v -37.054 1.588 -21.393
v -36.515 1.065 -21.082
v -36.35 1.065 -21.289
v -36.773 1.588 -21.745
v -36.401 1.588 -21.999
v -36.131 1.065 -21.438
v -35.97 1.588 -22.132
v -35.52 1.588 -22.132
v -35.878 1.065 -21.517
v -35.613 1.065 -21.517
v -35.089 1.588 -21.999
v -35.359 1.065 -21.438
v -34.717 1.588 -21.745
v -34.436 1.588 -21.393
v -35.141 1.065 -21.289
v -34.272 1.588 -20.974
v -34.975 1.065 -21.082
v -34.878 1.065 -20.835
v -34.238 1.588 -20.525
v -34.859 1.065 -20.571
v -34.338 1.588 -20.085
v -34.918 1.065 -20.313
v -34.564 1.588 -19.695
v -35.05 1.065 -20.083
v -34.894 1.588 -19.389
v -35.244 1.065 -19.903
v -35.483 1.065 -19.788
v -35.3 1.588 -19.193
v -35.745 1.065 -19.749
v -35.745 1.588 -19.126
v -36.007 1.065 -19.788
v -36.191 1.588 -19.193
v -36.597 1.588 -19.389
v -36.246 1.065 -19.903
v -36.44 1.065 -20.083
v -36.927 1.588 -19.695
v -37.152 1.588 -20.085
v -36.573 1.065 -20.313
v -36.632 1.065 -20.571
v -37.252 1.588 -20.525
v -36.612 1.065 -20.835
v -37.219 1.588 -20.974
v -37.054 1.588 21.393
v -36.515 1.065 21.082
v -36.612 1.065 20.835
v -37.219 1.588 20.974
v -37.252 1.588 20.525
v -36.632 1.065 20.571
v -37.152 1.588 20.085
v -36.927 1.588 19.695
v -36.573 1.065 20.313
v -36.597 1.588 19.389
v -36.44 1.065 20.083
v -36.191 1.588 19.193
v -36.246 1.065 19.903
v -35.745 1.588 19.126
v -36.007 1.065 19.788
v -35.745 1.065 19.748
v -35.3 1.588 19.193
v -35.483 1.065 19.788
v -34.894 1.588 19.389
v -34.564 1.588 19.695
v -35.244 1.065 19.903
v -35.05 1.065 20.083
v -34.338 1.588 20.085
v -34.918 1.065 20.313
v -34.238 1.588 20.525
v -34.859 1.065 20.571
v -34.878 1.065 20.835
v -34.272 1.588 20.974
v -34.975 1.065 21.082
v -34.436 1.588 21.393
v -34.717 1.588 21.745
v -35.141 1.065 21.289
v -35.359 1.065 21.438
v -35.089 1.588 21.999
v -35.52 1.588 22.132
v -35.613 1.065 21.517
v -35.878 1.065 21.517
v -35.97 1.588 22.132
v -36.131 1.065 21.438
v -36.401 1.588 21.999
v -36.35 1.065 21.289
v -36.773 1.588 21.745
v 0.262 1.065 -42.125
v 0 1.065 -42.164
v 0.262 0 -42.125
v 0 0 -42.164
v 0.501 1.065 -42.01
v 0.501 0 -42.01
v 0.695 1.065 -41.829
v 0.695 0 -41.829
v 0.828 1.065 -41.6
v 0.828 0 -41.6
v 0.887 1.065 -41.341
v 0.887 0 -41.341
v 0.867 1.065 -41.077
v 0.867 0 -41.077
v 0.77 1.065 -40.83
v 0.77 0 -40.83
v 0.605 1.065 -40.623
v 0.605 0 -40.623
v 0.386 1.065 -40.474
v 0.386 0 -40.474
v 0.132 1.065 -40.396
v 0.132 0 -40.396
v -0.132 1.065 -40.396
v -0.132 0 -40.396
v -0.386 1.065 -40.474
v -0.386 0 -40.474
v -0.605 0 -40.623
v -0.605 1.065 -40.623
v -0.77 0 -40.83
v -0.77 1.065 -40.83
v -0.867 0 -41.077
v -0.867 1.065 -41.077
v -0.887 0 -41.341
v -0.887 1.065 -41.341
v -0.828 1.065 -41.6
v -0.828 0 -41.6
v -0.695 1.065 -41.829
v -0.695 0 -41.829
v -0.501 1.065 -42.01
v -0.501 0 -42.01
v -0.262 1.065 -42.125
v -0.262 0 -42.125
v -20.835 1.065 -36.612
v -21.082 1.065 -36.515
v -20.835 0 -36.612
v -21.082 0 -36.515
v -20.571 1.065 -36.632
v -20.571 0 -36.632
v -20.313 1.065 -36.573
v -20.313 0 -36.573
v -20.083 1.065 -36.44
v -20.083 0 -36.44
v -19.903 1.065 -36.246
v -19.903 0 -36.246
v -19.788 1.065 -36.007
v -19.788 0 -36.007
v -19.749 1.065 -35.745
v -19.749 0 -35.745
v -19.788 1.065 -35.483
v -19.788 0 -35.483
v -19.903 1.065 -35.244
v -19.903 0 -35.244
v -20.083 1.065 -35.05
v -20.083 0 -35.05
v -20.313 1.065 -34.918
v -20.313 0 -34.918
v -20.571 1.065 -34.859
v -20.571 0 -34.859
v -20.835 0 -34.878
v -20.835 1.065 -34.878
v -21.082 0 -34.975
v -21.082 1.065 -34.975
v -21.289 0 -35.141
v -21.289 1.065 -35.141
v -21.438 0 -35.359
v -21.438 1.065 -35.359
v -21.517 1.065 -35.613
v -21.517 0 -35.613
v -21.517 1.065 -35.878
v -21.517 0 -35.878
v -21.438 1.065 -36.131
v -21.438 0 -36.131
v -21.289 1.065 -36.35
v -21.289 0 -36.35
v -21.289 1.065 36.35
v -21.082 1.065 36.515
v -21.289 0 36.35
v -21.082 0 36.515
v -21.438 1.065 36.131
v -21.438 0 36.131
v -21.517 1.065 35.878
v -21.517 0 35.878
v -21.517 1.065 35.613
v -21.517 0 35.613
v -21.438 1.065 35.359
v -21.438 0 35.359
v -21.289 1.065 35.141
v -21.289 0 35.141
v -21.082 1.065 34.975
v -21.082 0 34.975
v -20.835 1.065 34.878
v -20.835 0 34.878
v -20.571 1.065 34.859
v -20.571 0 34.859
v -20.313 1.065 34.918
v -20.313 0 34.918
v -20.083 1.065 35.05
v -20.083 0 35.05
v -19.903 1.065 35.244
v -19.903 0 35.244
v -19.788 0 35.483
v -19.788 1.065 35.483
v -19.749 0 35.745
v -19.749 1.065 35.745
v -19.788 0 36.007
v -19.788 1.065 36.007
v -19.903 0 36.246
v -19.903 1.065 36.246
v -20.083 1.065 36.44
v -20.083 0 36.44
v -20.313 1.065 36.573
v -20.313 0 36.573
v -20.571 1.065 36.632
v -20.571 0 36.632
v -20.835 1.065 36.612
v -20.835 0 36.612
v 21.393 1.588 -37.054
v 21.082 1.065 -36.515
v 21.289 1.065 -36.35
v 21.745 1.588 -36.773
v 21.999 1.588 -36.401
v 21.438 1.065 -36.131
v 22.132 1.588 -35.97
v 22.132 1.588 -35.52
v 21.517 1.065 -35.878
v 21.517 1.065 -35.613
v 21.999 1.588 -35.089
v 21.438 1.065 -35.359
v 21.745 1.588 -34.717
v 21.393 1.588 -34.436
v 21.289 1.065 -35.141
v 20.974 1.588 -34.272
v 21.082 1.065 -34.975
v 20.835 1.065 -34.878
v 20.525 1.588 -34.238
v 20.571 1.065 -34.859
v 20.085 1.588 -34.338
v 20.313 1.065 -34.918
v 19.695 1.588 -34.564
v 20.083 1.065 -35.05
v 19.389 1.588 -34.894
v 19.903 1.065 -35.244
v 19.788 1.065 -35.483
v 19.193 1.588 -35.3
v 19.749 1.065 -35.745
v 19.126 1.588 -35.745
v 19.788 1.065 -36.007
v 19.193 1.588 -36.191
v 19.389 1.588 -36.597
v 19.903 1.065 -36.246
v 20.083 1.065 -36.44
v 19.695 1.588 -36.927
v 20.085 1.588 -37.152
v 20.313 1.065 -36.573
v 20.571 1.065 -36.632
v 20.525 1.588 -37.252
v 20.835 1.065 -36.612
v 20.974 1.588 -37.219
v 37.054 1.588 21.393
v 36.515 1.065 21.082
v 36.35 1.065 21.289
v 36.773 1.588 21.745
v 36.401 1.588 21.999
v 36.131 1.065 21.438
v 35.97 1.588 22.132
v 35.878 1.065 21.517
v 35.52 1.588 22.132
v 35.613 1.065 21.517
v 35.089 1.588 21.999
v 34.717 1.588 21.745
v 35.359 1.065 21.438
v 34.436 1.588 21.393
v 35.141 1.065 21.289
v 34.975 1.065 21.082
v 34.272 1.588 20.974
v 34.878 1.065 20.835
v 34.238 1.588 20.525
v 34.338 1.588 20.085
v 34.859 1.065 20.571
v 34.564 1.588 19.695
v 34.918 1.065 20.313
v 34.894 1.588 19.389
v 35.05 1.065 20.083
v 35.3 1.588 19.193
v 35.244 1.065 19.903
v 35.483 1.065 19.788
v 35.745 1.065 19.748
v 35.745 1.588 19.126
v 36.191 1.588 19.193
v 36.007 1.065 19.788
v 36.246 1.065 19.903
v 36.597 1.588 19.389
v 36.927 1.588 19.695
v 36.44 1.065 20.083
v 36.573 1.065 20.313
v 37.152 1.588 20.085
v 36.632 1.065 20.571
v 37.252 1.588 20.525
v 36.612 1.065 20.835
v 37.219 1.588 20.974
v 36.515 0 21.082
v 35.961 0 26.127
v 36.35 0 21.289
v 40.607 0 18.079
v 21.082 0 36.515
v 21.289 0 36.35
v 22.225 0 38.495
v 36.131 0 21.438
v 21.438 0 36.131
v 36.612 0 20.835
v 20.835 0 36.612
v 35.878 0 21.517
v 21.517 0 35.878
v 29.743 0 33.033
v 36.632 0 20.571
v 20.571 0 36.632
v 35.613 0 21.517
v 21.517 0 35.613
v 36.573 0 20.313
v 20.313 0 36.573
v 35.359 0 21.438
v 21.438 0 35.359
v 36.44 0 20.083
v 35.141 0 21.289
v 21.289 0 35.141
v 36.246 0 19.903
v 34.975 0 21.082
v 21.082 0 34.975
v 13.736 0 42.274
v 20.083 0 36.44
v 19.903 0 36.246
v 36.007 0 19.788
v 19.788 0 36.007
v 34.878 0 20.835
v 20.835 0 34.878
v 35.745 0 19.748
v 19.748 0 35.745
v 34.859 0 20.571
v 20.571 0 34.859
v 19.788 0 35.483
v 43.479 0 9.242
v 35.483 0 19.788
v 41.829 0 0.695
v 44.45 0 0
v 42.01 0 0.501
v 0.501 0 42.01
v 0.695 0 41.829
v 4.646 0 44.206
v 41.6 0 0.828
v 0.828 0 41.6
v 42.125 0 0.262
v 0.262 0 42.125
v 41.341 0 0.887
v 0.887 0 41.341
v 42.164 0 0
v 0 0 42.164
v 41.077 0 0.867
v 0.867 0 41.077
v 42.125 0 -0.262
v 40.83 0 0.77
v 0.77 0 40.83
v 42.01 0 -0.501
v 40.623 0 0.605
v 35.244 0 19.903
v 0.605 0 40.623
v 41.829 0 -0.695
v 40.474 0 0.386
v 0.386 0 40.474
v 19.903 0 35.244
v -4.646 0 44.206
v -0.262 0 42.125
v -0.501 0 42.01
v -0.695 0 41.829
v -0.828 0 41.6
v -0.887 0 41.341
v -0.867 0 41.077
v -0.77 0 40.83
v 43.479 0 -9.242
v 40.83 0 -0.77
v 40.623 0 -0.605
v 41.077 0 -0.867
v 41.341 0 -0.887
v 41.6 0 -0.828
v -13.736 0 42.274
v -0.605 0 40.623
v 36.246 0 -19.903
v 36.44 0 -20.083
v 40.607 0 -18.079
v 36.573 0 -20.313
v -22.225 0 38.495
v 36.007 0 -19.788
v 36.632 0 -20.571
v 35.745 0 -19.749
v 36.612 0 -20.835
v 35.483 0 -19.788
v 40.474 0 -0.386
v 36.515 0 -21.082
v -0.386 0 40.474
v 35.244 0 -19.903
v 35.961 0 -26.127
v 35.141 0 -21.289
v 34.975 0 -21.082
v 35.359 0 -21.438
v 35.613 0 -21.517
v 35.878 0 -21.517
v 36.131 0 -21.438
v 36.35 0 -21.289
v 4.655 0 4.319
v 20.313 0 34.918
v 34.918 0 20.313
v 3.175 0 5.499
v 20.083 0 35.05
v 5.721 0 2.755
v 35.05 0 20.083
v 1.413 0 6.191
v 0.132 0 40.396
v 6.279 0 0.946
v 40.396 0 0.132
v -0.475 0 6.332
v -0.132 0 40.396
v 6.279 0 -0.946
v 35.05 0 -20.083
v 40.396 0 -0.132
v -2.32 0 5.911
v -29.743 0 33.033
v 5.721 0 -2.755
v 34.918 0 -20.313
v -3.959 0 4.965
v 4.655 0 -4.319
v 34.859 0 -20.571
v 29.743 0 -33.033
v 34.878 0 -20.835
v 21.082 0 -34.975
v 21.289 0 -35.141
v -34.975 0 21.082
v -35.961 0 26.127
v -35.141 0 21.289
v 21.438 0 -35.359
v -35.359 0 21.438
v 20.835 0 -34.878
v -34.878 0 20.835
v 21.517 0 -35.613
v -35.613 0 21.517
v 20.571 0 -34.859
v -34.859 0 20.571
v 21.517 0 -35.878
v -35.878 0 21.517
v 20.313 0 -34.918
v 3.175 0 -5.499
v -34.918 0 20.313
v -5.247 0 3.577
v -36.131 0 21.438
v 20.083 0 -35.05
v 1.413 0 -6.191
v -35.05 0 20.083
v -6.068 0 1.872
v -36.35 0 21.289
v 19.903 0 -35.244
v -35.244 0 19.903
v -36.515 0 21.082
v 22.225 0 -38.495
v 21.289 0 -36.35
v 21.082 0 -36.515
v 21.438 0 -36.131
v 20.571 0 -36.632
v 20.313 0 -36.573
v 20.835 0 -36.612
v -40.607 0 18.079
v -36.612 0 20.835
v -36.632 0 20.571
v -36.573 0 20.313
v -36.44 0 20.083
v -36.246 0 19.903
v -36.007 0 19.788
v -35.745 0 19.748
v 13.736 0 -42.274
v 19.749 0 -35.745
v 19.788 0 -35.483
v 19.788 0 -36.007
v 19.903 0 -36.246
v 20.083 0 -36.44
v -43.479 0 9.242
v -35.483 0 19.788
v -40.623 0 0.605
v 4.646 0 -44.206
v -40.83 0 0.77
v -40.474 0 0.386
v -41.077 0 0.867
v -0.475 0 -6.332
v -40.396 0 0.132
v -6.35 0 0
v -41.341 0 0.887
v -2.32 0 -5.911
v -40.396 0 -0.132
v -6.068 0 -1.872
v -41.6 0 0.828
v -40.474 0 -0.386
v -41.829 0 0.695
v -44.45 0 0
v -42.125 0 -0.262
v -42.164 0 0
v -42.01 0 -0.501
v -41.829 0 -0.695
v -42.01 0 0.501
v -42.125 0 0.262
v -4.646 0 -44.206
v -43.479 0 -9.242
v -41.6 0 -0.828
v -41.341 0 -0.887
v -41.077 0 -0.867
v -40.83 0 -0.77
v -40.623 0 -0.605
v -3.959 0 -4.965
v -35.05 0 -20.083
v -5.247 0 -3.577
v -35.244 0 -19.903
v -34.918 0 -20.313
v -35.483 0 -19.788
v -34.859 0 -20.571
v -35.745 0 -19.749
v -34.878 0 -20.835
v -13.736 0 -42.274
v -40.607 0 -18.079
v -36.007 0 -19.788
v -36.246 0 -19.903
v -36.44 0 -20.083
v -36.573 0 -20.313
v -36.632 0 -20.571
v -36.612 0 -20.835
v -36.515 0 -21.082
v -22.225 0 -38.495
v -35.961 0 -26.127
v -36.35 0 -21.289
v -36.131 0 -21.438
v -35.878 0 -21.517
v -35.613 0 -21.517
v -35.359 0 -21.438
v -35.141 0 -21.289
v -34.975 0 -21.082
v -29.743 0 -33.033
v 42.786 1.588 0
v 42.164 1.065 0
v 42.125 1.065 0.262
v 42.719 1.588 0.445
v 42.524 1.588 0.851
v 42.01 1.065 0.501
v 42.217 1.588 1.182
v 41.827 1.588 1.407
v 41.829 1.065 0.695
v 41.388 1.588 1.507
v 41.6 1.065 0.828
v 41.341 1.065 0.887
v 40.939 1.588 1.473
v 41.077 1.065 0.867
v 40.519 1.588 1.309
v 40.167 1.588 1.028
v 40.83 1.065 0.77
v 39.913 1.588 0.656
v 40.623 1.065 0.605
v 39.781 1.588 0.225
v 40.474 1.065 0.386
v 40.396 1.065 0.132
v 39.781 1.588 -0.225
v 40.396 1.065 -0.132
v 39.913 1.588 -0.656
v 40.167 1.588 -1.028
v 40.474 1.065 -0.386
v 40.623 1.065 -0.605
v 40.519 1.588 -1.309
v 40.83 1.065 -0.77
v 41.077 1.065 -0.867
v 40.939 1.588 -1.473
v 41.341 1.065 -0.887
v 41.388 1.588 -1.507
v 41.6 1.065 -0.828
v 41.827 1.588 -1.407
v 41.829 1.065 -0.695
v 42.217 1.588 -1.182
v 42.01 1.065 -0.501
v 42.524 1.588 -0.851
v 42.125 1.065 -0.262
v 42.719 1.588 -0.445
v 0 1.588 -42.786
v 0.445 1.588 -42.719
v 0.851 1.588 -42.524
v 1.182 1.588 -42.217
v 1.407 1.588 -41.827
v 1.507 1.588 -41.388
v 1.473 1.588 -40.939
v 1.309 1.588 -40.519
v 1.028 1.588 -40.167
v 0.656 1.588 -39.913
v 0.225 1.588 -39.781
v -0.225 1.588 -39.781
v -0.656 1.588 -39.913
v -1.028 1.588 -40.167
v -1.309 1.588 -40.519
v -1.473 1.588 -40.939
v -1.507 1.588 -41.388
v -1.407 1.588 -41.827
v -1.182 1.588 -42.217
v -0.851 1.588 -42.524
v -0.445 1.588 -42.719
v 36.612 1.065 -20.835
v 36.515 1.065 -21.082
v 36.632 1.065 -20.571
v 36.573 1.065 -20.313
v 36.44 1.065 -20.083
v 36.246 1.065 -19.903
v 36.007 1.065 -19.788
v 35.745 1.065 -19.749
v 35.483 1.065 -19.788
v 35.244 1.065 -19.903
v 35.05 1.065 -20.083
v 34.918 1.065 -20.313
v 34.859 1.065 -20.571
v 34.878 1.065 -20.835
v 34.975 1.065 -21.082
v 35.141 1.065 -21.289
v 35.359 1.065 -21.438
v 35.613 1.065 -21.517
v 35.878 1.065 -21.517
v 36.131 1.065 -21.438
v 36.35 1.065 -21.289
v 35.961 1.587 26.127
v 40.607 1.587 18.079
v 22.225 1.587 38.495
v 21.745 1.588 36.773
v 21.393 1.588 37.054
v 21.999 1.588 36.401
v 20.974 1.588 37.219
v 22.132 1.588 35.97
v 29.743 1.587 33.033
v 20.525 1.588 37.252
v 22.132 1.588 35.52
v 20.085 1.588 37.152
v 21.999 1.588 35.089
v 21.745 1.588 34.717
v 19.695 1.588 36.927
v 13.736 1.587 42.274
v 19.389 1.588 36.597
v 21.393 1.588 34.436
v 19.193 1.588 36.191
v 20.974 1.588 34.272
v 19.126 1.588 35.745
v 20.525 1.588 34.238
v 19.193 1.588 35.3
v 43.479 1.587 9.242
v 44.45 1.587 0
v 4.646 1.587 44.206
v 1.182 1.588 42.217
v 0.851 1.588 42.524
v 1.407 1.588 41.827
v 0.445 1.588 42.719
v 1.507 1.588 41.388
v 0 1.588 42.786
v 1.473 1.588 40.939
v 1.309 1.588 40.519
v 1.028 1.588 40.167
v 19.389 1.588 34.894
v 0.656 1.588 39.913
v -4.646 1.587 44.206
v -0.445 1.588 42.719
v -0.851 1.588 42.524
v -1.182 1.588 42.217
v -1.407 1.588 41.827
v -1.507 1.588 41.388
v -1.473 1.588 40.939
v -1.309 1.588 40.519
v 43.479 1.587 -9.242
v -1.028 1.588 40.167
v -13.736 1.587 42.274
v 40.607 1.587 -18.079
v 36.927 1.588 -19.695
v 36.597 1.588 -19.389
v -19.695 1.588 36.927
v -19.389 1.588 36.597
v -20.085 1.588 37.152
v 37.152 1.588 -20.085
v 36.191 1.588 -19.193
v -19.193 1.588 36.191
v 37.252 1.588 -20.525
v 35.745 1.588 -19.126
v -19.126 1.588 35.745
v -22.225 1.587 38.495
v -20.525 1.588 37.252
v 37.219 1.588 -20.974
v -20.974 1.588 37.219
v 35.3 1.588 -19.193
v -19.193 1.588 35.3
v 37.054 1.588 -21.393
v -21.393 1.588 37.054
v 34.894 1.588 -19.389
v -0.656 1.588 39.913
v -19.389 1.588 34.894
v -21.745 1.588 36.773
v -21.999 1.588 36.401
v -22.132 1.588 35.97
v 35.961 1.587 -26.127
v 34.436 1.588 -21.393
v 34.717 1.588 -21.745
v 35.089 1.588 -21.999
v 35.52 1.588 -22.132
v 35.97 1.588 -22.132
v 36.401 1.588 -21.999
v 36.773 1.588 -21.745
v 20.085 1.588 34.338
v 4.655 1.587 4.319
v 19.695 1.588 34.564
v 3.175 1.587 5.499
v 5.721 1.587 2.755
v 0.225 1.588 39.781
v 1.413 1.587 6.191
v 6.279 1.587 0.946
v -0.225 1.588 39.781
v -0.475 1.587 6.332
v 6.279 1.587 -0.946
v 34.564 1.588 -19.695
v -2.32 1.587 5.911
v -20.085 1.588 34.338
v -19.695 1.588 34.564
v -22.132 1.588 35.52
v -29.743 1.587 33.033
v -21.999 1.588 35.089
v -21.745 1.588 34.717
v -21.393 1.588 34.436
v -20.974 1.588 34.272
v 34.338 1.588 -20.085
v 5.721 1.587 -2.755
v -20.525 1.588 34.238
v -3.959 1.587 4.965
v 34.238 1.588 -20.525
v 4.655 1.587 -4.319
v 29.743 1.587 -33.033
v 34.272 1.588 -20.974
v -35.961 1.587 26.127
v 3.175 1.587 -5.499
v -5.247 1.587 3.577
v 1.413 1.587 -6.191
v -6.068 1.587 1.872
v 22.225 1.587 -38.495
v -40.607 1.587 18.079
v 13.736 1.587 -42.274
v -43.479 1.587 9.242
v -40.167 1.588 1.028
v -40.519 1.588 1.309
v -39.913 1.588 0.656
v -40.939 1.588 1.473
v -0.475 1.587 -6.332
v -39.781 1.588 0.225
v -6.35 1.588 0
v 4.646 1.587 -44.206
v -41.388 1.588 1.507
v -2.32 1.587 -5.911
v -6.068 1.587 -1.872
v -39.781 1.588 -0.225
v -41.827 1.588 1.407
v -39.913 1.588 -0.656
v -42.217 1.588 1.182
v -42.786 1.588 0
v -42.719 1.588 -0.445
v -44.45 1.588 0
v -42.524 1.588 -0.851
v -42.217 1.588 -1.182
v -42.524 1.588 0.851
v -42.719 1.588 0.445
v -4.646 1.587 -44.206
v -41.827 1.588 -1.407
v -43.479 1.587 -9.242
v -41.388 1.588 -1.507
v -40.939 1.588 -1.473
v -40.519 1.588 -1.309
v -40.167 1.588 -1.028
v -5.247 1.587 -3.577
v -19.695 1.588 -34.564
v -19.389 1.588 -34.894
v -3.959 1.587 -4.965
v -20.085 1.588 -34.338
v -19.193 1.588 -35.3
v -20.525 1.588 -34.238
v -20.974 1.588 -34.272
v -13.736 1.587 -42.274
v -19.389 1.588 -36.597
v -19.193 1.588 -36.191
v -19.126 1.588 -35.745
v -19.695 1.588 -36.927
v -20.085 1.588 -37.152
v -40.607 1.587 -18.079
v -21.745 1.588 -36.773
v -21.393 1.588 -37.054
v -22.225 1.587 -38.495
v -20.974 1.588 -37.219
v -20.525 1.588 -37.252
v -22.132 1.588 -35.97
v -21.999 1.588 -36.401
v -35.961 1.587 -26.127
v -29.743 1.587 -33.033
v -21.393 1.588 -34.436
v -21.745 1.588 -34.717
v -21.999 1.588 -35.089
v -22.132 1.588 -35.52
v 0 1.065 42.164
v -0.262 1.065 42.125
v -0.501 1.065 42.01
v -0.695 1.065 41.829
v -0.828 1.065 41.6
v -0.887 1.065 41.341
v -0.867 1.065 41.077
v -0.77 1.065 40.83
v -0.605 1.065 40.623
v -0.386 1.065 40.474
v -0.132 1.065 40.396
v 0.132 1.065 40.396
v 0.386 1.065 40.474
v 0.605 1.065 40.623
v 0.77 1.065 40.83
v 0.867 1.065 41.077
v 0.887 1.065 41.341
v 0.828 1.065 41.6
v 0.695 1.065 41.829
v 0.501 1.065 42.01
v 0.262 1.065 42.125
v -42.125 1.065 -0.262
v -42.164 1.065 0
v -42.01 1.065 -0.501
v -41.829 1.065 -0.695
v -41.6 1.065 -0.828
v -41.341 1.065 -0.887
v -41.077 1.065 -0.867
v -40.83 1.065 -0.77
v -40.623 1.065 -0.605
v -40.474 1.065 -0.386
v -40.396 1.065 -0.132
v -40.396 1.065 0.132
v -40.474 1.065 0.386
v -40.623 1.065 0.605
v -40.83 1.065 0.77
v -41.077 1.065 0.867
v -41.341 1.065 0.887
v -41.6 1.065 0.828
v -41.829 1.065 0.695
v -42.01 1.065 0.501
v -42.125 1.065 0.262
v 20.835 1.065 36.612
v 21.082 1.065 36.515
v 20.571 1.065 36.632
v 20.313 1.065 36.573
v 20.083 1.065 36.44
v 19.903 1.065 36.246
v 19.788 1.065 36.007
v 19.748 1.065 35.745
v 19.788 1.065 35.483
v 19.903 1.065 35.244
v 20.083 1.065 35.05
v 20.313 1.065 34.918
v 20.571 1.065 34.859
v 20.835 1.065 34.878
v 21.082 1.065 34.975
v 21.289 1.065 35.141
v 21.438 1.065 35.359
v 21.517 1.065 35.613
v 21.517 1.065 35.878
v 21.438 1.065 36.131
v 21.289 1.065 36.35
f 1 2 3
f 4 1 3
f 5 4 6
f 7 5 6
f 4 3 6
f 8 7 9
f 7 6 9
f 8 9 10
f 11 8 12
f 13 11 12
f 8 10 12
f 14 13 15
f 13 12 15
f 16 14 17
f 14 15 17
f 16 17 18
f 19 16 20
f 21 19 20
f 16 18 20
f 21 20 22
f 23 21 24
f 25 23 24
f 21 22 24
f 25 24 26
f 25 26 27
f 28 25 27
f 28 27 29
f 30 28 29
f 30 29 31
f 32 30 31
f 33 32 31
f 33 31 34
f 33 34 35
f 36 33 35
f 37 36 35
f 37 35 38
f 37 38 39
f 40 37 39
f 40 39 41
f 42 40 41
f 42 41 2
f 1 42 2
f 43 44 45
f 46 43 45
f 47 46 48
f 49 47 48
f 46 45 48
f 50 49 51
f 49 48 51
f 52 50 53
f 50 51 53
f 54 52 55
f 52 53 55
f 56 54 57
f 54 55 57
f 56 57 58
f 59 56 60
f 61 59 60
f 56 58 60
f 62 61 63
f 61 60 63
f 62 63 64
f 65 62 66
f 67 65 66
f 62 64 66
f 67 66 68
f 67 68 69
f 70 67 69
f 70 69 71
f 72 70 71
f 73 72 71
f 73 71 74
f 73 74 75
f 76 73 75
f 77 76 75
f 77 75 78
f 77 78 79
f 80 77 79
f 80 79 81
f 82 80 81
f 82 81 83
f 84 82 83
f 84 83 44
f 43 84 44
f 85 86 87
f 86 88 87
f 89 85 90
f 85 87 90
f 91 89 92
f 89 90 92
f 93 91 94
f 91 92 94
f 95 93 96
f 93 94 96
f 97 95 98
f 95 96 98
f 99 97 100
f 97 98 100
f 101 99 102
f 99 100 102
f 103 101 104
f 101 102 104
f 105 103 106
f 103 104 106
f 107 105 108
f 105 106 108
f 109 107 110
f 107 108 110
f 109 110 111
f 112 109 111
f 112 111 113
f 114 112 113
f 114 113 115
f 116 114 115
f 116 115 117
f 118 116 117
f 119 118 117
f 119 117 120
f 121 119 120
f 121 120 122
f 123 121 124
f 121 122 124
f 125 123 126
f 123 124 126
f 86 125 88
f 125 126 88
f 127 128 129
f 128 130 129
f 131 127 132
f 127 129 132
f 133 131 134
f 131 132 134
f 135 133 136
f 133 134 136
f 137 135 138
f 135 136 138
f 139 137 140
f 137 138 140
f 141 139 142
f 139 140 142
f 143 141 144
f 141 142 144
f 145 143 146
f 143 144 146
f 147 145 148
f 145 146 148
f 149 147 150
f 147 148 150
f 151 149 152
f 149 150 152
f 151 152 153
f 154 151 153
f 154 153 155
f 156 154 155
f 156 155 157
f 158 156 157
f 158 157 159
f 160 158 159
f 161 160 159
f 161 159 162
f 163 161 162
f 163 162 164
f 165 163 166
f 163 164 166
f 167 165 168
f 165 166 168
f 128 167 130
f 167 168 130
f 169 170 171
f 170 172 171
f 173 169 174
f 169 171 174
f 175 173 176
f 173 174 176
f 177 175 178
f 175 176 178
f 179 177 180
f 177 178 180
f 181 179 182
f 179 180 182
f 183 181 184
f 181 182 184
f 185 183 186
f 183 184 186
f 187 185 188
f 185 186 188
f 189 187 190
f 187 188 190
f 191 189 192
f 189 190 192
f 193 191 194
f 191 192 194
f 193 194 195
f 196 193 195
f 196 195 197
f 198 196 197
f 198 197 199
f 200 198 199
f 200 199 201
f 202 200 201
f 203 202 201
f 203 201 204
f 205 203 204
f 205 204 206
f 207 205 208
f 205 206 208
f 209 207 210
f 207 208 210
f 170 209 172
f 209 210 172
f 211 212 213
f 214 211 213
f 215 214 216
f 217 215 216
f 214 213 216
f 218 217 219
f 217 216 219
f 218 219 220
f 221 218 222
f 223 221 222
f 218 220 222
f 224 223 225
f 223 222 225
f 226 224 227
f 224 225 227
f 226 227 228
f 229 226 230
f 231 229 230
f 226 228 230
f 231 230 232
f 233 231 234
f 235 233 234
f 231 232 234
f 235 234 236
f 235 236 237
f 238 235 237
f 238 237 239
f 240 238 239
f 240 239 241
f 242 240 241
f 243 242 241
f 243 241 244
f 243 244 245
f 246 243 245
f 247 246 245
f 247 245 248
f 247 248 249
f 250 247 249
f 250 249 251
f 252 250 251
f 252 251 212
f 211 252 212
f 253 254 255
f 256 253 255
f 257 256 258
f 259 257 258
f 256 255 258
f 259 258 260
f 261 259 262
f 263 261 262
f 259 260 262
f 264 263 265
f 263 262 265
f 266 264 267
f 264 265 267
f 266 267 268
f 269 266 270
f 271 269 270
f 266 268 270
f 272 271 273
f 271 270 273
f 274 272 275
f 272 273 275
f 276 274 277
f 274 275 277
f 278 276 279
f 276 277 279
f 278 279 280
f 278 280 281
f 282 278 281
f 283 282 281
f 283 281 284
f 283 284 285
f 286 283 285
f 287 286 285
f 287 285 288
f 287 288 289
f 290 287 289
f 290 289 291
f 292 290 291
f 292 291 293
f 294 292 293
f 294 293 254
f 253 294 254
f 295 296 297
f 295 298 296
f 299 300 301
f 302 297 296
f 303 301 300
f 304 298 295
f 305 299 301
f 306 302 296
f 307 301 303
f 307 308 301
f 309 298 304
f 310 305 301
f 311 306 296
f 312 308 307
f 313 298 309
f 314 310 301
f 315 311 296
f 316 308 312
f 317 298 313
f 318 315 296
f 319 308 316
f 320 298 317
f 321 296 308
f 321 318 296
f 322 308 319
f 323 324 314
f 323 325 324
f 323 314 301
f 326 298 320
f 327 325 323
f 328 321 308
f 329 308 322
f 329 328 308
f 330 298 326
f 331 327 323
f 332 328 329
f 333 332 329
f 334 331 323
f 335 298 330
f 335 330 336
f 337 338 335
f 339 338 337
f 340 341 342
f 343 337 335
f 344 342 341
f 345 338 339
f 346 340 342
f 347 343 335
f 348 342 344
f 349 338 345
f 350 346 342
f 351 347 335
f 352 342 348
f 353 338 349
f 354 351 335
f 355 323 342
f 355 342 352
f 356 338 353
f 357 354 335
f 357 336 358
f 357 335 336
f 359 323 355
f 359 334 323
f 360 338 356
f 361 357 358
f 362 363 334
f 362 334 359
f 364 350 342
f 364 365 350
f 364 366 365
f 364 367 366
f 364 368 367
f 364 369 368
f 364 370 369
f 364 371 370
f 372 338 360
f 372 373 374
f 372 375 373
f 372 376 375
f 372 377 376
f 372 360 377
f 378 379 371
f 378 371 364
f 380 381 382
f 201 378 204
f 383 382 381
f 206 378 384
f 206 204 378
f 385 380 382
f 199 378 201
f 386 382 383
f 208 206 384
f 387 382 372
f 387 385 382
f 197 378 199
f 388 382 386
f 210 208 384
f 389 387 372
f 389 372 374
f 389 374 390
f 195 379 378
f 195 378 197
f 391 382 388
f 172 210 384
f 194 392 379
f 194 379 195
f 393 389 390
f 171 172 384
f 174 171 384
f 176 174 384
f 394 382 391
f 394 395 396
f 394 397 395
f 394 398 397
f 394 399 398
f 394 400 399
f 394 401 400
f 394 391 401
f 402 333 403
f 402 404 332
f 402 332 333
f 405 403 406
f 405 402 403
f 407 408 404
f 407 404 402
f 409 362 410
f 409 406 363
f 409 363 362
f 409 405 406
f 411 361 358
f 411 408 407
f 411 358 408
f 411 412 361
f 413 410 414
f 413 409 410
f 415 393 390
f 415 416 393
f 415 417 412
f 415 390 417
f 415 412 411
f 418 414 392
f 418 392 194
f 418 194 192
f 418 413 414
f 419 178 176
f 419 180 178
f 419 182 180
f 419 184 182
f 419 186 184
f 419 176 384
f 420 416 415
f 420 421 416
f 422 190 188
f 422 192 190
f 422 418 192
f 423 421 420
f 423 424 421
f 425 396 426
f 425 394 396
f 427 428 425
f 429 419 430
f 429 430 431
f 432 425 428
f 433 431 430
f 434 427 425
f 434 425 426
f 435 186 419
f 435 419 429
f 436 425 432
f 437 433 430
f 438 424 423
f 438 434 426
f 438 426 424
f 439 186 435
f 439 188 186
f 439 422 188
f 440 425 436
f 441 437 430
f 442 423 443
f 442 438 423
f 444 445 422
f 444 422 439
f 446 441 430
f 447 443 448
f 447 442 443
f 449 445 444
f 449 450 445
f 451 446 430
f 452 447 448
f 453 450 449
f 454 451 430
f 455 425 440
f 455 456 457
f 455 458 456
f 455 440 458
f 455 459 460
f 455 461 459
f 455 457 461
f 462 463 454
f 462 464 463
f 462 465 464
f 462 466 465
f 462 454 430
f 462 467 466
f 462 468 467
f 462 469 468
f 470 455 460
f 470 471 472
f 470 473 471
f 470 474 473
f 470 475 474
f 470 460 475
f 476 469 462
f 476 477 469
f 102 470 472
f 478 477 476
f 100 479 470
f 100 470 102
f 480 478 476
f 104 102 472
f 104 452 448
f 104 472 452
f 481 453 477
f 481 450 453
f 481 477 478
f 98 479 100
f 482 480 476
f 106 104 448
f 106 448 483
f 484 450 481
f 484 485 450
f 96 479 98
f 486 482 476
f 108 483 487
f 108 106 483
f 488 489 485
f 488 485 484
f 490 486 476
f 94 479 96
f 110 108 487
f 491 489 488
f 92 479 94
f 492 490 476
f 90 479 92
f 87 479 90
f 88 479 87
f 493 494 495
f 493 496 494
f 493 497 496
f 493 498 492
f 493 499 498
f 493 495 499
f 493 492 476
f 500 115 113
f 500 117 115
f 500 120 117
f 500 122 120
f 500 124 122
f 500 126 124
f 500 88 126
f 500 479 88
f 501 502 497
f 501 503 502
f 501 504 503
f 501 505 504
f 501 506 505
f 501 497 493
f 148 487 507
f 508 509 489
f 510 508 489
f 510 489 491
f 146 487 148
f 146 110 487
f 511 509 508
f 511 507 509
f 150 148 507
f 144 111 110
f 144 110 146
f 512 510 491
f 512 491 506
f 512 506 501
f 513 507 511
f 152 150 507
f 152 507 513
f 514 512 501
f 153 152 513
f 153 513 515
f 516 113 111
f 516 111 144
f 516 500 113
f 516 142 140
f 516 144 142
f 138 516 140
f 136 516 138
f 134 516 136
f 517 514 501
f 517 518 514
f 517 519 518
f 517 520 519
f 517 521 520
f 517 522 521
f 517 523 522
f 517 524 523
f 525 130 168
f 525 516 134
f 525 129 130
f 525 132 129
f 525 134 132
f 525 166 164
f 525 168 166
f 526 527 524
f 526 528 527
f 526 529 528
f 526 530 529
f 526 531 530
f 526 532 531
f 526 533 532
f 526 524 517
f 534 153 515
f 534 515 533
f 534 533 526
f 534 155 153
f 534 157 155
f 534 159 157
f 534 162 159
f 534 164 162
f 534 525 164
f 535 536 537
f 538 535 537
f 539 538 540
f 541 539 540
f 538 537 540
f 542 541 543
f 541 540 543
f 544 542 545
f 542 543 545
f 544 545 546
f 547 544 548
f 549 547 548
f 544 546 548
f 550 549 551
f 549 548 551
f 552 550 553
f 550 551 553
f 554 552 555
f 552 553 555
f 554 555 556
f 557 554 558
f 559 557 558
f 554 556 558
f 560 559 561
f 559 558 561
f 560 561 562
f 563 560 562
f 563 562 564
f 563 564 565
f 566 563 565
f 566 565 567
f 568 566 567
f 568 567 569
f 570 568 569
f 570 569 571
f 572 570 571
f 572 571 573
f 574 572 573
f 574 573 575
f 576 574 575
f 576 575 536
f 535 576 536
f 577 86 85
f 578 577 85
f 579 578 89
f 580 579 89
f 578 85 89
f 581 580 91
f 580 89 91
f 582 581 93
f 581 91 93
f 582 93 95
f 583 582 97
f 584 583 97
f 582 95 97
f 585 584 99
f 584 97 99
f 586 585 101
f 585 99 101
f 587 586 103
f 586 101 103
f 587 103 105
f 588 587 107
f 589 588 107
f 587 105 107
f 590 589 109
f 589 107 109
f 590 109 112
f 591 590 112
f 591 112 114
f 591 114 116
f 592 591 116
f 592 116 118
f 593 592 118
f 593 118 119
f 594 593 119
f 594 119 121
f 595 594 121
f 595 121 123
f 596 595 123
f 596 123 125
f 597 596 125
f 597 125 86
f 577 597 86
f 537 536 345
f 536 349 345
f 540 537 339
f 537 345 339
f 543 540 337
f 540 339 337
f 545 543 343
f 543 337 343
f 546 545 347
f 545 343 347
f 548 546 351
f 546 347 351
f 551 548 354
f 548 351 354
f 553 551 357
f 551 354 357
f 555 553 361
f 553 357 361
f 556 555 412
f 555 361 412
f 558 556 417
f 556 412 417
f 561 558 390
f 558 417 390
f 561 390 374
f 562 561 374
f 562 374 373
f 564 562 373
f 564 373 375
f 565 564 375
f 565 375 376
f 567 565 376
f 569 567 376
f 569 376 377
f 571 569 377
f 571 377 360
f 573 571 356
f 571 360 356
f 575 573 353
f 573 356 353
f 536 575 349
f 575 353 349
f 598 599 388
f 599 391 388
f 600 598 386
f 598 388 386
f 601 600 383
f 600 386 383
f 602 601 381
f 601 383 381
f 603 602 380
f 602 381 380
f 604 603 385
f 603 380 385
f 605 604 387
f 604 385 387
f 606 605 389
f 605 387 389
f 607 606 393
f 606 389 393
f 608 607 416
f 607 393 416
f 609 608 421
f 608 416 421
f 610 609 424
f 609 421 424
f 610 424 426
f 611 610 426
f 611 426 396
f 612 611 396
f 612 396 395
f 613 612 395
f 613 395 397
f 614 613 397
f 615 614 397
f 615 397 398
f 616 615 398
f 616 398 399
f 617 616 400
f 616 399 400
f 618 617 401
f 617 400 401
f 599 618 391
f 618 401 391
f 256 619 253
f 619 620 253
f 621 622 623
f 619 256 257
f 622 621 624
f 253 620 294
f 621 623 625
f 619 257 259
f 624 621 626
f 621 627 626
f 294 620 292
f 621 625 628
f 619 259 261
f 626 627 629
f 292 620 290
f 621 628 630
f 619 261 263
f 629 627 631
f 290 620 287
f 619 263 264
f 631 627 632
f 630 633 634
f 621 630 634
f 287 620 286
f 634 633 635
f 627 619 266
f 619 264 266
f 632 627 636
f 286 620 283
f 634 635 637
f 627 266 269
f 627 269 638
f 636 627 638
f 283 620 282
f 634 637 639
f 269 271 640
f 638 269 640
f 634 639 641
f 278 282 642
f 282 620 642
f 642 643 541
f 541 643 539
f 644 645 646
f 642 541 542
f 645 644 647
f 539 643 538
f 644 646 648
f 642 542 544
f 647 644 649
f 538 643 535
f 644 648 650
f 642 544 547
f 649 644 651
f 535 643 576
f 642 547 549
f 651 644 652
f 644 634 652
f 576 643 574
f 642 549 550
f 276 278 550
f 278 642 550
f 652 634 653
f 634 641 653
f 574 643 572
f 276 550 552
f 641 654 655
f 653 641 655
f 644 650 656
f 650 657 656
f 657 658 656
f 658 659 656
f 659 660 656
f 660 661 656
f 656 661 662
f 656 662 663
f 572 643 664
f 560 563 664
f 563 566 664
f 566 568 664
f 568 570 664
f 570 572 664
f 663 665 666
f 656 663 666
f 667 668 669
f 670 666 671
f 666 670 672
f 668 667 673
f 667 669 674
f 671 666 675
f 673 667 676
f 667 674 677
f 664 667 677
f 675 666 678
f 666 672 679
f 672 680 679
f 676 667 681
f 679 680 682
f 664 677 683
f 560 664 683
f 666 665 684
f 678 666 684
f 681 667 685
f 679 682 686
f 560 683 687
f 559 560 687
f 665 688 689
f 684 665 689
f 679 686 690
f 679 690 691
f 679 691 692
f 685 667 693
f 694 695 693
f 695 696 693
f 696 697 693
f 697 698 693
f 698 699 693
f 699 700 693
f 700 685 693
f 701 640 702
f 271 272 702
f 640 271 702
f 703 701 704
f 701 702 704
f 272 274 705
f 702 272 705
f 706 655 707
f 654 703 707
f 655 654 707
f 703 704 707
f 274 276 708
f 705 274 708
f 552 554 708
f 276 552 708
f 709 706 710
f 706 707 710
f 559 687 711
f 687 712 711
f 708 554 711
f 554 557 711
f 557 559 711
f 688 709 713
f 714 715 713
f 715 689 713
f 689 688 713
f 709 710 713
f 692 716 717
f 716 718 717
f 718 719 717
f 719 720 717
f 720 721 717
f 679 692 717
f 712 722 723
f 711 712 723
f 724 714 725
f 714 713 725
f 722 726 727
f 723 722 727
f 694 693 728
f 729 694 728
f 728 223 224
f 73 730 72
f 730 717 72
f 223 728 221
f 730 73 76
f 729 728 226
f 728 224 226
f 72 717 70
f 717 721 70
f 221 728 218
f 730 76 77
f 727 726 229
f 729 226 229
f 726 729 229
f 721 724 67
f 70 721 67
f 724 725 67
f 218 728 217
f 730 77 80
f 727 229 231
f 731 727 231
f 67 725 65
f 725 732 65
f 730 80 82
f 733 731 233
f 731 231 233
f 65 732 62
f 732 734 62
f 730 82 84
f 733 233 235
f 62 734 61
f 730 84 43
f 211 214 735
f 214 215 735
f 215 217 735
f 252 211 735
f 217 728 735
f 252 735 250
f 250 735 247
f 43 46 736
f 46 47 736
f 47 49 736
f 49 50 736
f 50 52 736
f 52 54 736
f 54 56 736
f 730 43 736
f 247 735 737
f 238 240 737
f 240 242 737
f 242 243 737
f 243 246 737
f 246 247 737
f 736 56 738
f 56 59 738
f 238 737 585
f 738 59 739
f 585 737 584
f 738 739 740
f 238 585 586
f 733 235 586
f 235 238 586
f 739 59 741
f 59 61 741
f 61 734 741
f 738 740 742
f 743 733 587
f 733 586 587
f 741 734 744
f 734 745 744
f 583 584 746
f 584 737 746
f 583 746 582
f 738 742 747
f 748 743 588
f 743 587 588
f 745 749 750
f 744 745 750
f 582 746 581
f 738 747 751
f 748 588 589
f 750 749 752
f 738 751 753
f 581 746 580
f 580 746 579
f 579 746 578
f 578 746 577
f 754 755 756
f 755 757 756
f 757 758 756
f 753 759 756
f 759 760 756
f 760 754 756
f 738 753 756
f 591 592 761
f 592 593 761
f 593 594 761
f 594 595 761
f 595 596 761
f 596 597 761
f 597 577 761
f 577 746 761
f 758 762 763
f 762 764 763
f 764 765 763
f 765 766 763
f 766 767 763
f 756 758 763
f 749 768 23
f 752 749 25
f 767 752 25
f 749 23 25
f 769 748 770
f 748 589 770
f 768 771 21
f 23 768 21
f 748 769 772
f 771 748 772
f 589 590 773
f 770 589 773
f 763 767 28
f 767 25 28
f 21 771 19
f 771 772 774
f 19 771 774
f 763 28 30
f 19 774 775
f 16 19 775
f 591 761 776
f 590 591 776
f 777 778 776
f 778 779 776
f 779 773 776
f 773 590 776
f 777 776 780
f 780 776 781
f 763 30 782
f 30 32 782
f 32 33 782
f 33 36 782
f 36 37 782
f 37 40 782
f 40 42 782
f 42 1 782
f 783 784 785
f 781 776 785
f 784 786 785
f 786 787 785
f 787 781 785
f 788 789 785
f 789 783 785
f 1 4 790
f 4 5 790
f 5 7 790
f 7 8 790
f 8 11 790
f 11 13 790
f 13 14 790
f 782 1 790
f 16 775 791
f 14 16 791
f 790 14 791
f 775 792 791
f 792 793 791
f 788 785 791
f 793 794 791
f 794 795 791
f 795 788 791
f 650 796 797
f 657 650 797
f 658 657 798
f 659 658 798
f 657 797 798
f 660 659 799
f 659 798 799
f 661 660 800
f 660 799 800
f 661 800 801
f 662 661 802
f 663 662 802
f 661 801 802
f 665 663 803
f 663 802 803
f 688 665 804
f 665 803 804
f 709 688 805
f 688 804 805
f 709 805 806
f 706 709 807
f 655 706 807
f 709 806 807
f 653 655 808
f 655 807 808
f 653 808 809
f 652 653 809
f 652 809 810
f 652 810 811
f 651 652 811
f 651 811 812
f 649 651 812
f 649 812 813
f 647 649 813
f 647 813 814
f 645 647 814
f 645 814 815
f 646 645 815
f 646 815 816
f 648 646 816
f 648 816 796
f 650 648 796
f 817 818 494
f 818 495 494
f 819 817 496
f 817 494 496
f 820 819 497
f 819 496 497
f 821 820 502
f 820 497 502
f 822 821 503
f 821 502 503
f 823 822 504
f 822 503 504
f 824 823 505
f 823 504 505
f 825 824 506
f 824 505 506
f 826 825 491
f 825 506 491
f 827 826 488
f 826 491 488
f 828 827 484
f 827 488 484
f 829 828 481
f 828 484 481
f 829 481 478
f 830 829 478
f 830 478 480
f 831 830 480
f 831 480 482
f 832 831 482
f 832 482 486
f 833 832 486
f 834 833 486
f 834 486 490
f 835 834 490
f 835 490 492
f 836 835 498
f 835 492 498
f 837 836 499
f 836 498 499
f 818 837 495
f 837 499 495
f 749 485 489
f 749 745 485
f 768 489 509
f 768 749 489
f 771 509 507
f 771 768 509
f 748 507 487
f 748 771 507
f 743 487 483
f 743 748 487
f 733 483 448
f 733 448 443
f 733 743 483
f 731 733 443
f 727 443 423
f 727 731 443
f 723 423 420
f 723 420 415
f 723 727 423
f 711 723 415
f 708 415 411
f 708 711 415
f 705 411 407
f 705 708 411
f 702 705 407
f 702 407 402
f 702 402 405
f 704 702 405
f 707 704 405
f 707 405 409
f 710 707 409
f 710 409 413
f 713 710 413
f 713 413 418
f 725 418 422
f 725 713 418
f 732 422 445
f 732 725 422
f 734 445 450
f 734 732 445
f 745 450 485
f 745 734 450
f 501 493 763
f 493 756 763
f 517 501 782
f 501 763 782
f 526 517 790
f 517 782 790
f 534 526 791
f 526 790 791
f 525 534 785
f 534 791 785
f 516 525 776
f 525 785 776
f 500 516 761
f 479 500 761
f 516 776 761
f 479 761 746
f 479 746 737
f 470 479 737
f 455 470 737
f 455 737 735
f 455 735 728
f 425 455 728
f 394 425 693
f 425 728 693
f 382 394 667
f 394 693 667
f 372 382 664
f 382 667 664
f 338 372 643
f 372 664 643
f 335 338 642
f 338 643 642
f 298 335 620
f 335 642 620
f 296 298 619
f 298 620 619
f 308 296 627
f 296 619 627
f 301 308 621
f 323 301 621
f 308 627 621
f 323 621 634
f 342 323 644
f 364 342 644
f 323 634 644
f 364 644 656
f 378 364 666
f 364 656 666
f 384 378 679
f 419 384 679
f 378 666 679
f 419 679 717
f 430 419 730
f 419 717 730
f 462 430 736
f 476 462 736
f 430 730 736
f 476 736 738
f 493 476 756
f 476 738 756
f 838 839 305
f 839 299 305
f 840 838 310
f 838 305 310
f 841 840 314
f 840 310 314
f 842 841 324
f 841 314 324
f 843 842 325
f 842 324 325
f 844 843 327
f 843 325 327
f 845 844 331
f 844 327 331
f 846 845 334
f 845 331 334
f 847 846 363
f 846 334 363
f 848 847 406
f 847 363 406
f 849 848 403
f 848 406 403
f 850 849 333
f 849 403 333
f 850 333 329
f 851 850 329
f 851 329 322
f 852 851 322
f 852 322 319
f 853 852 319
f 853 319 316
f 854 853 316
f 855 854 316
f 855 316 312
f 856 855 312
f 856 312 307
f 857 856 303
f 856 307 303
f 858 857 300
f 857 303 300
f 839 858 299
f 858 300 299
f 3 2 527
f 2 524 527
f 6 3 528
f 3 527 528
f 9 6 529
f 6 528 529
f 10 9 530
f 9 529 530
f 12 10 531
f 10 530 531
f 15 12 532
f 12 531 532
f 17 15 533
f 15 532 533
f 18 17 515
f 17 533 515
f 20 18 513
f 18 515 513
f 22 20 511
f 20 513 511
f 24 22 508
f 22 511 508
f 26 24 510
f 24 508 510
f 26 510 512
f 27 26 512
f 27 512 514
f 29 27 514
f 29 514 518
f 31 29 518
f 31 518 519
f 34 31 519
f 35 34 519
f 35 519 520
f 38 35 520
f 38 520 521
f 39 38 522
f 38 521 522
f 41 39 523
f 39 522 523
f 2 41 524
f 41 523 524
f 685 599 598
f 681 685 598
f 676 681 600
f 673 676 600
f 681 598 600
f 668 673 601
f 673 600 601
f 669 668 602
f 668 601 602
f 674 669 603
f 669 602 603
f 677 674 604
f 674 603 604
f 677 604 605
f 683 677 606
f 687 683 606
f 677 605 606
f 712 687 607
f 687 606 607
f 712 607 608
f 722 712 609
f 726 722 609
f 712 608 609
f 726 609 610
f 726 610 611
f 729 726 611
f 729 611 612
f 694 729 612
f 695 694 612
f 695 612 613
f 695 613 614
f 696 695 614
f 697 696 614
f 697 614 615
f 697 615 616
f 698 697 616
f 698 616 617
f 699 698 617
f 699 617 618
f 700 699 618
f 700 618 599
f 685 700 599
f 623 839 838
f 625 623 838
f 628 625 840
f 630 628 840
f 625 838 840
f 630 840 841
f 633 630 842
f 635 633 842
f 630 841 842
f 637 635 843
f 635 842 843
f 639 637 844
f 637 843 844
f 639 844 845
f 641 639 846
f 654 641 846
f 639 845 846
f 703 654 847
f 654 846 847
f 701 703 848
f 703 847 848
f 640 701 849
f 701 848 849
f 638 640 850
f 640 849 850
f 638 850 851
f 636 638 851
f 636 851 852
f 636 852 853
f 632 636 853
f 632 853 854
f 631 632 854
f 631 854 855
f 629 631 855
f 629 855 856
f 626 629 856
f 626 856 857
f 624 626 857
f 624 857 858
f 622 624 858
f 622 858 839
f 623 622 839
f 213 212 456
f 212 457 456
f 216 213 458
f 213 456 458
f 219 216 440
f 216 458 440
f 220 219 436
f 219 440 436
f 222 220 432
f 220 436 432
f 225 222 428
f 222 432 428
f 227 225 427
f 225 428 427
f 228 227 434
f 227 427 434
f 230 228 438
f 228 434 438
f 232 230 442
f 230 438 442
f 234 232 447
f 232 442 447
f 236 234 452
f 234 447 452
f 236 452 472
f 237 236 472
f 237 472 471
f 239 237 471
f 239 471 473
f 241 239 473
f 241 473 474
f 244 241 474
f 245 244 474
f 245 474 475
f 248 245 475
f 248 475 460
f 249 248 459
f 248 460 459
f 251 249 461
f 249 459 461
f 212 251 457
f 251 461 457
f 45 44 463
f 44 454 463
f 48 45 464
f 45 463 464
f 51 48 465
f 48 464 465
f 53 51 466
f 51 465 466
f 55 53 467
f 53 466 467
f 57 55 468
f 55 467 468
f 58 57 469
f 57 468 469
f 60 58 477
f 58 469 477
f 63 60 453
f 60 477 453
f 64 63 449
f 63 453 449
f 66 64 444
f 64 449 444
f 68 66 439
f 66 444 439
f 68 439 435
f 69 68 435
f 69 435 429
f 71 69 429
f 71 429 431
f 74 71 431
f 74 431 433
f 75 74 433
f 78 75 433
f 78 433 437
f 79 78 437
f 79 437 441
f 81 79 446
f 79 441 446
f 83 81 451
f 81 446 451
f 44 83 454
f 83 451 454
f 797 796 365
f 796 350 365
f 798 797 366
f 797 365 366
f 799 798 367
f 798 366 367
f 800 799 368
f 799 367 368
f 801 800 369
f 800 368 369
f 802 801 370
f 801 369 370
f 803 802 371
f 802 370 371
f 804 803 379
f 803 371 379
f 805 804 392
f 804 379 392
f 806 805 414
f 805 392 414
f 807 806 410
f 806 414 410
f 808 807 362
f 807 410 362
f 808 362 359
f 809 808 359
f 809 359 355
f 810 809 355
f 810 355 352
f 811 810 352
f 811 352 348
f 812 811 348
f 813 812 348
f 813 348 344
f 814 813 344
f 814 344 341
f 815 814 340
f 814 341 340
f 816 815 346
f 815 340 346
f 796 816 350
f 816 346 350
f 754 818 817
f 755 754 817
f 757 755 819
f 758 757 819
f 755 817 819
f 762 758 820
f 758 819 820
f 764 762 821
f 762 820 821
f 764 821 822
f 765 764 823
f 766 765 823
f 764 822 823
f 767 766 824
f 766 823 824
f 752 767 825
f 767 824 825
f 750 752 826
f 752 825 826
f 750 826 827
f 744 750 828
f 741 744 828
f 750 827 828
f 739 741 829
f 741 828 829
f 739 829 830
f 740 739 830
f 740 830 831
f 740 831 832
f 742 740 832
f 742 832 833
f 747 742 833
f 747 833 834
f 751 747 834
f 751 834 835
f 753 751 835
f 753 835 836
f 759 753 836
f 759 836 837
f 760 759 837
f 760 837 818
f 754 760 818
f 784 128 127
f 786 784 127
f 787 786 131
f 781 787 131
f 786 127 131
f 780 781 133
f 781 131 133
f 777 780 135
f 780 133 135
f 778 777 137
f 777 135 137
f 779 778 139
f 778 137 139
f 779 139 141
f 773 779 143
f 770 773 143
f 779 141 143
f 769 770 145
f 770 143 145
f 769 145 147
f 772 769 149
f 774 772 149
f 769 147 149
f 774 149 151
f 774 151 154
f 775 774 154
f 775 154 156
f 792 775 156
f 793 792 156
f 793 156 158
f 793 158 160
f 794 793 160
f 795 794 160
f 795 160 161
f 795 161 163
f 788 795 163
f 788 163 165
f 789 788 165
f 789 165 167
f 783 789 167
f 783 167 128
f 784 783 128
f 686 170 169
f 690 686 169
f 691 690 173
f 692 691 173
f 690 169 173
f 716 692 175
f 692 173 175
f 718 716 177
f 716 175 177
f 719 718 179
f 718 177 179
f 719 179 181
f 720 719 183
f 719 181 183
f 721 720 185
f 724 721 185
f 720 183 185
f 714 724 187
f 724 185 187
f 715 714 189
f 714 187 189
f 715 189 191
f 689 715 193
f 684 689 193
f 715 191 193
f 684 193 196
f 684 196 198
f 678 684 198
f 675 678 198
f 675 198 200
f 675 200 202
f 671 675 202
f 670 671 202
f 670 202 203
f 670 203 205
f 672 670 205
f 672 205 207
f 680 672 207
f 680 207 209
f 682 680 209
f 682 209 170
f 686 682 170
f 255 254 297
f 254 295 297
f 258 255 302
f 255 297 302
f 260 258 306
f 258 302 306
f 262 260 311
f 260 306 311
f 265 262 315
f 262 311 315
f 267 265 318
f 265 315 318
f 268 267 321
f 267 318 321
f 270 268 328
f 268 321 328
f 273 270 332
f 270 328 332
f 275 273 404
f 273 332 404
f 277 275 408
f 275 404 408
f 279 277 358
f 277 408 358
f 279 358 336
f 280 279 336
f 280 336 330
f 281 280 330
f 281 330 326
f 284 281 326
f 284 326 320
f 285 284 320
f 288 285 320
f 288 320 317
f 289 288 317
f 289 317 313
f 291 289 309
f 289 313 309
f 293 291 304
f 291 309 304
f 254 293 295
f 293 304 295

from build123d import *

# Parameters (mm, degrees)
SKETCH1_W                                         = 38.1
SKETCH1_H                                         = 1.5875
CSK_FOR_0_FLAT_HEAD_MACHINE_SCREW_100_D           = 1.778
CSK_FOR_0_FLAT_HEAD_MACHINE_SCREW_100_CSINK_D     = 3.0226
CSK_FOR_0_FLAT_HEAD_MACHINE_SCREW_100_CSINK_ANGLE = 100
CIRPATTERN1_COUNT                                 = 12


with BuildPart() as part:
    # Sketch1 → Revolve1 (revolve)
    with BuildSketch(Plane.XY):
        with Locations((-25.4, 0.79375)):
            Rectangle(SKETCH1_W, SKETCH1_H)
    revolve(axis=Axis((0, 55, 0), (0, -1, 0)))

    # CSK for #0 Flat Head Machine Screw (100)1 (through all)
    with Locations(Plane(origin=(0, 1.5875, 0), x_dir=(1, 0, 0), z_dir=(0, 1, 0))):
        with Locations((-41.275, 0)):
            csk_for_0_flat_head_machine_screw_100 = CounterSinkHole(CSK_FOR_0_FLAT_HEAD_MACHINE_SCREW_100_D / 2, CSK_FOR_0_FLAT_HEAD_MACHINE_SCREW_100_CSINK_D / 2, counter_sink_angle=CSK_FOR_0_FLAT_HEAD_MACHINE_SCREW_100_CSINK_ANGLE)

    # CirPattern1: CSK for #0 Flat Head Machine Screw (100)1 ×12 about axis
    cirpattern1_axis = Axis((0, 0, 0), (0, 1, 0))
    for i in range(1, CIRPATTERN1_COUNT):
        add(csk_for_0_flat_head_machine_screw_100.rotate(cirpattern1_axis, i * 360 / CIRPATTERN1_COUNT), mode=Mode.SUBTRACT)


solid = part.part
